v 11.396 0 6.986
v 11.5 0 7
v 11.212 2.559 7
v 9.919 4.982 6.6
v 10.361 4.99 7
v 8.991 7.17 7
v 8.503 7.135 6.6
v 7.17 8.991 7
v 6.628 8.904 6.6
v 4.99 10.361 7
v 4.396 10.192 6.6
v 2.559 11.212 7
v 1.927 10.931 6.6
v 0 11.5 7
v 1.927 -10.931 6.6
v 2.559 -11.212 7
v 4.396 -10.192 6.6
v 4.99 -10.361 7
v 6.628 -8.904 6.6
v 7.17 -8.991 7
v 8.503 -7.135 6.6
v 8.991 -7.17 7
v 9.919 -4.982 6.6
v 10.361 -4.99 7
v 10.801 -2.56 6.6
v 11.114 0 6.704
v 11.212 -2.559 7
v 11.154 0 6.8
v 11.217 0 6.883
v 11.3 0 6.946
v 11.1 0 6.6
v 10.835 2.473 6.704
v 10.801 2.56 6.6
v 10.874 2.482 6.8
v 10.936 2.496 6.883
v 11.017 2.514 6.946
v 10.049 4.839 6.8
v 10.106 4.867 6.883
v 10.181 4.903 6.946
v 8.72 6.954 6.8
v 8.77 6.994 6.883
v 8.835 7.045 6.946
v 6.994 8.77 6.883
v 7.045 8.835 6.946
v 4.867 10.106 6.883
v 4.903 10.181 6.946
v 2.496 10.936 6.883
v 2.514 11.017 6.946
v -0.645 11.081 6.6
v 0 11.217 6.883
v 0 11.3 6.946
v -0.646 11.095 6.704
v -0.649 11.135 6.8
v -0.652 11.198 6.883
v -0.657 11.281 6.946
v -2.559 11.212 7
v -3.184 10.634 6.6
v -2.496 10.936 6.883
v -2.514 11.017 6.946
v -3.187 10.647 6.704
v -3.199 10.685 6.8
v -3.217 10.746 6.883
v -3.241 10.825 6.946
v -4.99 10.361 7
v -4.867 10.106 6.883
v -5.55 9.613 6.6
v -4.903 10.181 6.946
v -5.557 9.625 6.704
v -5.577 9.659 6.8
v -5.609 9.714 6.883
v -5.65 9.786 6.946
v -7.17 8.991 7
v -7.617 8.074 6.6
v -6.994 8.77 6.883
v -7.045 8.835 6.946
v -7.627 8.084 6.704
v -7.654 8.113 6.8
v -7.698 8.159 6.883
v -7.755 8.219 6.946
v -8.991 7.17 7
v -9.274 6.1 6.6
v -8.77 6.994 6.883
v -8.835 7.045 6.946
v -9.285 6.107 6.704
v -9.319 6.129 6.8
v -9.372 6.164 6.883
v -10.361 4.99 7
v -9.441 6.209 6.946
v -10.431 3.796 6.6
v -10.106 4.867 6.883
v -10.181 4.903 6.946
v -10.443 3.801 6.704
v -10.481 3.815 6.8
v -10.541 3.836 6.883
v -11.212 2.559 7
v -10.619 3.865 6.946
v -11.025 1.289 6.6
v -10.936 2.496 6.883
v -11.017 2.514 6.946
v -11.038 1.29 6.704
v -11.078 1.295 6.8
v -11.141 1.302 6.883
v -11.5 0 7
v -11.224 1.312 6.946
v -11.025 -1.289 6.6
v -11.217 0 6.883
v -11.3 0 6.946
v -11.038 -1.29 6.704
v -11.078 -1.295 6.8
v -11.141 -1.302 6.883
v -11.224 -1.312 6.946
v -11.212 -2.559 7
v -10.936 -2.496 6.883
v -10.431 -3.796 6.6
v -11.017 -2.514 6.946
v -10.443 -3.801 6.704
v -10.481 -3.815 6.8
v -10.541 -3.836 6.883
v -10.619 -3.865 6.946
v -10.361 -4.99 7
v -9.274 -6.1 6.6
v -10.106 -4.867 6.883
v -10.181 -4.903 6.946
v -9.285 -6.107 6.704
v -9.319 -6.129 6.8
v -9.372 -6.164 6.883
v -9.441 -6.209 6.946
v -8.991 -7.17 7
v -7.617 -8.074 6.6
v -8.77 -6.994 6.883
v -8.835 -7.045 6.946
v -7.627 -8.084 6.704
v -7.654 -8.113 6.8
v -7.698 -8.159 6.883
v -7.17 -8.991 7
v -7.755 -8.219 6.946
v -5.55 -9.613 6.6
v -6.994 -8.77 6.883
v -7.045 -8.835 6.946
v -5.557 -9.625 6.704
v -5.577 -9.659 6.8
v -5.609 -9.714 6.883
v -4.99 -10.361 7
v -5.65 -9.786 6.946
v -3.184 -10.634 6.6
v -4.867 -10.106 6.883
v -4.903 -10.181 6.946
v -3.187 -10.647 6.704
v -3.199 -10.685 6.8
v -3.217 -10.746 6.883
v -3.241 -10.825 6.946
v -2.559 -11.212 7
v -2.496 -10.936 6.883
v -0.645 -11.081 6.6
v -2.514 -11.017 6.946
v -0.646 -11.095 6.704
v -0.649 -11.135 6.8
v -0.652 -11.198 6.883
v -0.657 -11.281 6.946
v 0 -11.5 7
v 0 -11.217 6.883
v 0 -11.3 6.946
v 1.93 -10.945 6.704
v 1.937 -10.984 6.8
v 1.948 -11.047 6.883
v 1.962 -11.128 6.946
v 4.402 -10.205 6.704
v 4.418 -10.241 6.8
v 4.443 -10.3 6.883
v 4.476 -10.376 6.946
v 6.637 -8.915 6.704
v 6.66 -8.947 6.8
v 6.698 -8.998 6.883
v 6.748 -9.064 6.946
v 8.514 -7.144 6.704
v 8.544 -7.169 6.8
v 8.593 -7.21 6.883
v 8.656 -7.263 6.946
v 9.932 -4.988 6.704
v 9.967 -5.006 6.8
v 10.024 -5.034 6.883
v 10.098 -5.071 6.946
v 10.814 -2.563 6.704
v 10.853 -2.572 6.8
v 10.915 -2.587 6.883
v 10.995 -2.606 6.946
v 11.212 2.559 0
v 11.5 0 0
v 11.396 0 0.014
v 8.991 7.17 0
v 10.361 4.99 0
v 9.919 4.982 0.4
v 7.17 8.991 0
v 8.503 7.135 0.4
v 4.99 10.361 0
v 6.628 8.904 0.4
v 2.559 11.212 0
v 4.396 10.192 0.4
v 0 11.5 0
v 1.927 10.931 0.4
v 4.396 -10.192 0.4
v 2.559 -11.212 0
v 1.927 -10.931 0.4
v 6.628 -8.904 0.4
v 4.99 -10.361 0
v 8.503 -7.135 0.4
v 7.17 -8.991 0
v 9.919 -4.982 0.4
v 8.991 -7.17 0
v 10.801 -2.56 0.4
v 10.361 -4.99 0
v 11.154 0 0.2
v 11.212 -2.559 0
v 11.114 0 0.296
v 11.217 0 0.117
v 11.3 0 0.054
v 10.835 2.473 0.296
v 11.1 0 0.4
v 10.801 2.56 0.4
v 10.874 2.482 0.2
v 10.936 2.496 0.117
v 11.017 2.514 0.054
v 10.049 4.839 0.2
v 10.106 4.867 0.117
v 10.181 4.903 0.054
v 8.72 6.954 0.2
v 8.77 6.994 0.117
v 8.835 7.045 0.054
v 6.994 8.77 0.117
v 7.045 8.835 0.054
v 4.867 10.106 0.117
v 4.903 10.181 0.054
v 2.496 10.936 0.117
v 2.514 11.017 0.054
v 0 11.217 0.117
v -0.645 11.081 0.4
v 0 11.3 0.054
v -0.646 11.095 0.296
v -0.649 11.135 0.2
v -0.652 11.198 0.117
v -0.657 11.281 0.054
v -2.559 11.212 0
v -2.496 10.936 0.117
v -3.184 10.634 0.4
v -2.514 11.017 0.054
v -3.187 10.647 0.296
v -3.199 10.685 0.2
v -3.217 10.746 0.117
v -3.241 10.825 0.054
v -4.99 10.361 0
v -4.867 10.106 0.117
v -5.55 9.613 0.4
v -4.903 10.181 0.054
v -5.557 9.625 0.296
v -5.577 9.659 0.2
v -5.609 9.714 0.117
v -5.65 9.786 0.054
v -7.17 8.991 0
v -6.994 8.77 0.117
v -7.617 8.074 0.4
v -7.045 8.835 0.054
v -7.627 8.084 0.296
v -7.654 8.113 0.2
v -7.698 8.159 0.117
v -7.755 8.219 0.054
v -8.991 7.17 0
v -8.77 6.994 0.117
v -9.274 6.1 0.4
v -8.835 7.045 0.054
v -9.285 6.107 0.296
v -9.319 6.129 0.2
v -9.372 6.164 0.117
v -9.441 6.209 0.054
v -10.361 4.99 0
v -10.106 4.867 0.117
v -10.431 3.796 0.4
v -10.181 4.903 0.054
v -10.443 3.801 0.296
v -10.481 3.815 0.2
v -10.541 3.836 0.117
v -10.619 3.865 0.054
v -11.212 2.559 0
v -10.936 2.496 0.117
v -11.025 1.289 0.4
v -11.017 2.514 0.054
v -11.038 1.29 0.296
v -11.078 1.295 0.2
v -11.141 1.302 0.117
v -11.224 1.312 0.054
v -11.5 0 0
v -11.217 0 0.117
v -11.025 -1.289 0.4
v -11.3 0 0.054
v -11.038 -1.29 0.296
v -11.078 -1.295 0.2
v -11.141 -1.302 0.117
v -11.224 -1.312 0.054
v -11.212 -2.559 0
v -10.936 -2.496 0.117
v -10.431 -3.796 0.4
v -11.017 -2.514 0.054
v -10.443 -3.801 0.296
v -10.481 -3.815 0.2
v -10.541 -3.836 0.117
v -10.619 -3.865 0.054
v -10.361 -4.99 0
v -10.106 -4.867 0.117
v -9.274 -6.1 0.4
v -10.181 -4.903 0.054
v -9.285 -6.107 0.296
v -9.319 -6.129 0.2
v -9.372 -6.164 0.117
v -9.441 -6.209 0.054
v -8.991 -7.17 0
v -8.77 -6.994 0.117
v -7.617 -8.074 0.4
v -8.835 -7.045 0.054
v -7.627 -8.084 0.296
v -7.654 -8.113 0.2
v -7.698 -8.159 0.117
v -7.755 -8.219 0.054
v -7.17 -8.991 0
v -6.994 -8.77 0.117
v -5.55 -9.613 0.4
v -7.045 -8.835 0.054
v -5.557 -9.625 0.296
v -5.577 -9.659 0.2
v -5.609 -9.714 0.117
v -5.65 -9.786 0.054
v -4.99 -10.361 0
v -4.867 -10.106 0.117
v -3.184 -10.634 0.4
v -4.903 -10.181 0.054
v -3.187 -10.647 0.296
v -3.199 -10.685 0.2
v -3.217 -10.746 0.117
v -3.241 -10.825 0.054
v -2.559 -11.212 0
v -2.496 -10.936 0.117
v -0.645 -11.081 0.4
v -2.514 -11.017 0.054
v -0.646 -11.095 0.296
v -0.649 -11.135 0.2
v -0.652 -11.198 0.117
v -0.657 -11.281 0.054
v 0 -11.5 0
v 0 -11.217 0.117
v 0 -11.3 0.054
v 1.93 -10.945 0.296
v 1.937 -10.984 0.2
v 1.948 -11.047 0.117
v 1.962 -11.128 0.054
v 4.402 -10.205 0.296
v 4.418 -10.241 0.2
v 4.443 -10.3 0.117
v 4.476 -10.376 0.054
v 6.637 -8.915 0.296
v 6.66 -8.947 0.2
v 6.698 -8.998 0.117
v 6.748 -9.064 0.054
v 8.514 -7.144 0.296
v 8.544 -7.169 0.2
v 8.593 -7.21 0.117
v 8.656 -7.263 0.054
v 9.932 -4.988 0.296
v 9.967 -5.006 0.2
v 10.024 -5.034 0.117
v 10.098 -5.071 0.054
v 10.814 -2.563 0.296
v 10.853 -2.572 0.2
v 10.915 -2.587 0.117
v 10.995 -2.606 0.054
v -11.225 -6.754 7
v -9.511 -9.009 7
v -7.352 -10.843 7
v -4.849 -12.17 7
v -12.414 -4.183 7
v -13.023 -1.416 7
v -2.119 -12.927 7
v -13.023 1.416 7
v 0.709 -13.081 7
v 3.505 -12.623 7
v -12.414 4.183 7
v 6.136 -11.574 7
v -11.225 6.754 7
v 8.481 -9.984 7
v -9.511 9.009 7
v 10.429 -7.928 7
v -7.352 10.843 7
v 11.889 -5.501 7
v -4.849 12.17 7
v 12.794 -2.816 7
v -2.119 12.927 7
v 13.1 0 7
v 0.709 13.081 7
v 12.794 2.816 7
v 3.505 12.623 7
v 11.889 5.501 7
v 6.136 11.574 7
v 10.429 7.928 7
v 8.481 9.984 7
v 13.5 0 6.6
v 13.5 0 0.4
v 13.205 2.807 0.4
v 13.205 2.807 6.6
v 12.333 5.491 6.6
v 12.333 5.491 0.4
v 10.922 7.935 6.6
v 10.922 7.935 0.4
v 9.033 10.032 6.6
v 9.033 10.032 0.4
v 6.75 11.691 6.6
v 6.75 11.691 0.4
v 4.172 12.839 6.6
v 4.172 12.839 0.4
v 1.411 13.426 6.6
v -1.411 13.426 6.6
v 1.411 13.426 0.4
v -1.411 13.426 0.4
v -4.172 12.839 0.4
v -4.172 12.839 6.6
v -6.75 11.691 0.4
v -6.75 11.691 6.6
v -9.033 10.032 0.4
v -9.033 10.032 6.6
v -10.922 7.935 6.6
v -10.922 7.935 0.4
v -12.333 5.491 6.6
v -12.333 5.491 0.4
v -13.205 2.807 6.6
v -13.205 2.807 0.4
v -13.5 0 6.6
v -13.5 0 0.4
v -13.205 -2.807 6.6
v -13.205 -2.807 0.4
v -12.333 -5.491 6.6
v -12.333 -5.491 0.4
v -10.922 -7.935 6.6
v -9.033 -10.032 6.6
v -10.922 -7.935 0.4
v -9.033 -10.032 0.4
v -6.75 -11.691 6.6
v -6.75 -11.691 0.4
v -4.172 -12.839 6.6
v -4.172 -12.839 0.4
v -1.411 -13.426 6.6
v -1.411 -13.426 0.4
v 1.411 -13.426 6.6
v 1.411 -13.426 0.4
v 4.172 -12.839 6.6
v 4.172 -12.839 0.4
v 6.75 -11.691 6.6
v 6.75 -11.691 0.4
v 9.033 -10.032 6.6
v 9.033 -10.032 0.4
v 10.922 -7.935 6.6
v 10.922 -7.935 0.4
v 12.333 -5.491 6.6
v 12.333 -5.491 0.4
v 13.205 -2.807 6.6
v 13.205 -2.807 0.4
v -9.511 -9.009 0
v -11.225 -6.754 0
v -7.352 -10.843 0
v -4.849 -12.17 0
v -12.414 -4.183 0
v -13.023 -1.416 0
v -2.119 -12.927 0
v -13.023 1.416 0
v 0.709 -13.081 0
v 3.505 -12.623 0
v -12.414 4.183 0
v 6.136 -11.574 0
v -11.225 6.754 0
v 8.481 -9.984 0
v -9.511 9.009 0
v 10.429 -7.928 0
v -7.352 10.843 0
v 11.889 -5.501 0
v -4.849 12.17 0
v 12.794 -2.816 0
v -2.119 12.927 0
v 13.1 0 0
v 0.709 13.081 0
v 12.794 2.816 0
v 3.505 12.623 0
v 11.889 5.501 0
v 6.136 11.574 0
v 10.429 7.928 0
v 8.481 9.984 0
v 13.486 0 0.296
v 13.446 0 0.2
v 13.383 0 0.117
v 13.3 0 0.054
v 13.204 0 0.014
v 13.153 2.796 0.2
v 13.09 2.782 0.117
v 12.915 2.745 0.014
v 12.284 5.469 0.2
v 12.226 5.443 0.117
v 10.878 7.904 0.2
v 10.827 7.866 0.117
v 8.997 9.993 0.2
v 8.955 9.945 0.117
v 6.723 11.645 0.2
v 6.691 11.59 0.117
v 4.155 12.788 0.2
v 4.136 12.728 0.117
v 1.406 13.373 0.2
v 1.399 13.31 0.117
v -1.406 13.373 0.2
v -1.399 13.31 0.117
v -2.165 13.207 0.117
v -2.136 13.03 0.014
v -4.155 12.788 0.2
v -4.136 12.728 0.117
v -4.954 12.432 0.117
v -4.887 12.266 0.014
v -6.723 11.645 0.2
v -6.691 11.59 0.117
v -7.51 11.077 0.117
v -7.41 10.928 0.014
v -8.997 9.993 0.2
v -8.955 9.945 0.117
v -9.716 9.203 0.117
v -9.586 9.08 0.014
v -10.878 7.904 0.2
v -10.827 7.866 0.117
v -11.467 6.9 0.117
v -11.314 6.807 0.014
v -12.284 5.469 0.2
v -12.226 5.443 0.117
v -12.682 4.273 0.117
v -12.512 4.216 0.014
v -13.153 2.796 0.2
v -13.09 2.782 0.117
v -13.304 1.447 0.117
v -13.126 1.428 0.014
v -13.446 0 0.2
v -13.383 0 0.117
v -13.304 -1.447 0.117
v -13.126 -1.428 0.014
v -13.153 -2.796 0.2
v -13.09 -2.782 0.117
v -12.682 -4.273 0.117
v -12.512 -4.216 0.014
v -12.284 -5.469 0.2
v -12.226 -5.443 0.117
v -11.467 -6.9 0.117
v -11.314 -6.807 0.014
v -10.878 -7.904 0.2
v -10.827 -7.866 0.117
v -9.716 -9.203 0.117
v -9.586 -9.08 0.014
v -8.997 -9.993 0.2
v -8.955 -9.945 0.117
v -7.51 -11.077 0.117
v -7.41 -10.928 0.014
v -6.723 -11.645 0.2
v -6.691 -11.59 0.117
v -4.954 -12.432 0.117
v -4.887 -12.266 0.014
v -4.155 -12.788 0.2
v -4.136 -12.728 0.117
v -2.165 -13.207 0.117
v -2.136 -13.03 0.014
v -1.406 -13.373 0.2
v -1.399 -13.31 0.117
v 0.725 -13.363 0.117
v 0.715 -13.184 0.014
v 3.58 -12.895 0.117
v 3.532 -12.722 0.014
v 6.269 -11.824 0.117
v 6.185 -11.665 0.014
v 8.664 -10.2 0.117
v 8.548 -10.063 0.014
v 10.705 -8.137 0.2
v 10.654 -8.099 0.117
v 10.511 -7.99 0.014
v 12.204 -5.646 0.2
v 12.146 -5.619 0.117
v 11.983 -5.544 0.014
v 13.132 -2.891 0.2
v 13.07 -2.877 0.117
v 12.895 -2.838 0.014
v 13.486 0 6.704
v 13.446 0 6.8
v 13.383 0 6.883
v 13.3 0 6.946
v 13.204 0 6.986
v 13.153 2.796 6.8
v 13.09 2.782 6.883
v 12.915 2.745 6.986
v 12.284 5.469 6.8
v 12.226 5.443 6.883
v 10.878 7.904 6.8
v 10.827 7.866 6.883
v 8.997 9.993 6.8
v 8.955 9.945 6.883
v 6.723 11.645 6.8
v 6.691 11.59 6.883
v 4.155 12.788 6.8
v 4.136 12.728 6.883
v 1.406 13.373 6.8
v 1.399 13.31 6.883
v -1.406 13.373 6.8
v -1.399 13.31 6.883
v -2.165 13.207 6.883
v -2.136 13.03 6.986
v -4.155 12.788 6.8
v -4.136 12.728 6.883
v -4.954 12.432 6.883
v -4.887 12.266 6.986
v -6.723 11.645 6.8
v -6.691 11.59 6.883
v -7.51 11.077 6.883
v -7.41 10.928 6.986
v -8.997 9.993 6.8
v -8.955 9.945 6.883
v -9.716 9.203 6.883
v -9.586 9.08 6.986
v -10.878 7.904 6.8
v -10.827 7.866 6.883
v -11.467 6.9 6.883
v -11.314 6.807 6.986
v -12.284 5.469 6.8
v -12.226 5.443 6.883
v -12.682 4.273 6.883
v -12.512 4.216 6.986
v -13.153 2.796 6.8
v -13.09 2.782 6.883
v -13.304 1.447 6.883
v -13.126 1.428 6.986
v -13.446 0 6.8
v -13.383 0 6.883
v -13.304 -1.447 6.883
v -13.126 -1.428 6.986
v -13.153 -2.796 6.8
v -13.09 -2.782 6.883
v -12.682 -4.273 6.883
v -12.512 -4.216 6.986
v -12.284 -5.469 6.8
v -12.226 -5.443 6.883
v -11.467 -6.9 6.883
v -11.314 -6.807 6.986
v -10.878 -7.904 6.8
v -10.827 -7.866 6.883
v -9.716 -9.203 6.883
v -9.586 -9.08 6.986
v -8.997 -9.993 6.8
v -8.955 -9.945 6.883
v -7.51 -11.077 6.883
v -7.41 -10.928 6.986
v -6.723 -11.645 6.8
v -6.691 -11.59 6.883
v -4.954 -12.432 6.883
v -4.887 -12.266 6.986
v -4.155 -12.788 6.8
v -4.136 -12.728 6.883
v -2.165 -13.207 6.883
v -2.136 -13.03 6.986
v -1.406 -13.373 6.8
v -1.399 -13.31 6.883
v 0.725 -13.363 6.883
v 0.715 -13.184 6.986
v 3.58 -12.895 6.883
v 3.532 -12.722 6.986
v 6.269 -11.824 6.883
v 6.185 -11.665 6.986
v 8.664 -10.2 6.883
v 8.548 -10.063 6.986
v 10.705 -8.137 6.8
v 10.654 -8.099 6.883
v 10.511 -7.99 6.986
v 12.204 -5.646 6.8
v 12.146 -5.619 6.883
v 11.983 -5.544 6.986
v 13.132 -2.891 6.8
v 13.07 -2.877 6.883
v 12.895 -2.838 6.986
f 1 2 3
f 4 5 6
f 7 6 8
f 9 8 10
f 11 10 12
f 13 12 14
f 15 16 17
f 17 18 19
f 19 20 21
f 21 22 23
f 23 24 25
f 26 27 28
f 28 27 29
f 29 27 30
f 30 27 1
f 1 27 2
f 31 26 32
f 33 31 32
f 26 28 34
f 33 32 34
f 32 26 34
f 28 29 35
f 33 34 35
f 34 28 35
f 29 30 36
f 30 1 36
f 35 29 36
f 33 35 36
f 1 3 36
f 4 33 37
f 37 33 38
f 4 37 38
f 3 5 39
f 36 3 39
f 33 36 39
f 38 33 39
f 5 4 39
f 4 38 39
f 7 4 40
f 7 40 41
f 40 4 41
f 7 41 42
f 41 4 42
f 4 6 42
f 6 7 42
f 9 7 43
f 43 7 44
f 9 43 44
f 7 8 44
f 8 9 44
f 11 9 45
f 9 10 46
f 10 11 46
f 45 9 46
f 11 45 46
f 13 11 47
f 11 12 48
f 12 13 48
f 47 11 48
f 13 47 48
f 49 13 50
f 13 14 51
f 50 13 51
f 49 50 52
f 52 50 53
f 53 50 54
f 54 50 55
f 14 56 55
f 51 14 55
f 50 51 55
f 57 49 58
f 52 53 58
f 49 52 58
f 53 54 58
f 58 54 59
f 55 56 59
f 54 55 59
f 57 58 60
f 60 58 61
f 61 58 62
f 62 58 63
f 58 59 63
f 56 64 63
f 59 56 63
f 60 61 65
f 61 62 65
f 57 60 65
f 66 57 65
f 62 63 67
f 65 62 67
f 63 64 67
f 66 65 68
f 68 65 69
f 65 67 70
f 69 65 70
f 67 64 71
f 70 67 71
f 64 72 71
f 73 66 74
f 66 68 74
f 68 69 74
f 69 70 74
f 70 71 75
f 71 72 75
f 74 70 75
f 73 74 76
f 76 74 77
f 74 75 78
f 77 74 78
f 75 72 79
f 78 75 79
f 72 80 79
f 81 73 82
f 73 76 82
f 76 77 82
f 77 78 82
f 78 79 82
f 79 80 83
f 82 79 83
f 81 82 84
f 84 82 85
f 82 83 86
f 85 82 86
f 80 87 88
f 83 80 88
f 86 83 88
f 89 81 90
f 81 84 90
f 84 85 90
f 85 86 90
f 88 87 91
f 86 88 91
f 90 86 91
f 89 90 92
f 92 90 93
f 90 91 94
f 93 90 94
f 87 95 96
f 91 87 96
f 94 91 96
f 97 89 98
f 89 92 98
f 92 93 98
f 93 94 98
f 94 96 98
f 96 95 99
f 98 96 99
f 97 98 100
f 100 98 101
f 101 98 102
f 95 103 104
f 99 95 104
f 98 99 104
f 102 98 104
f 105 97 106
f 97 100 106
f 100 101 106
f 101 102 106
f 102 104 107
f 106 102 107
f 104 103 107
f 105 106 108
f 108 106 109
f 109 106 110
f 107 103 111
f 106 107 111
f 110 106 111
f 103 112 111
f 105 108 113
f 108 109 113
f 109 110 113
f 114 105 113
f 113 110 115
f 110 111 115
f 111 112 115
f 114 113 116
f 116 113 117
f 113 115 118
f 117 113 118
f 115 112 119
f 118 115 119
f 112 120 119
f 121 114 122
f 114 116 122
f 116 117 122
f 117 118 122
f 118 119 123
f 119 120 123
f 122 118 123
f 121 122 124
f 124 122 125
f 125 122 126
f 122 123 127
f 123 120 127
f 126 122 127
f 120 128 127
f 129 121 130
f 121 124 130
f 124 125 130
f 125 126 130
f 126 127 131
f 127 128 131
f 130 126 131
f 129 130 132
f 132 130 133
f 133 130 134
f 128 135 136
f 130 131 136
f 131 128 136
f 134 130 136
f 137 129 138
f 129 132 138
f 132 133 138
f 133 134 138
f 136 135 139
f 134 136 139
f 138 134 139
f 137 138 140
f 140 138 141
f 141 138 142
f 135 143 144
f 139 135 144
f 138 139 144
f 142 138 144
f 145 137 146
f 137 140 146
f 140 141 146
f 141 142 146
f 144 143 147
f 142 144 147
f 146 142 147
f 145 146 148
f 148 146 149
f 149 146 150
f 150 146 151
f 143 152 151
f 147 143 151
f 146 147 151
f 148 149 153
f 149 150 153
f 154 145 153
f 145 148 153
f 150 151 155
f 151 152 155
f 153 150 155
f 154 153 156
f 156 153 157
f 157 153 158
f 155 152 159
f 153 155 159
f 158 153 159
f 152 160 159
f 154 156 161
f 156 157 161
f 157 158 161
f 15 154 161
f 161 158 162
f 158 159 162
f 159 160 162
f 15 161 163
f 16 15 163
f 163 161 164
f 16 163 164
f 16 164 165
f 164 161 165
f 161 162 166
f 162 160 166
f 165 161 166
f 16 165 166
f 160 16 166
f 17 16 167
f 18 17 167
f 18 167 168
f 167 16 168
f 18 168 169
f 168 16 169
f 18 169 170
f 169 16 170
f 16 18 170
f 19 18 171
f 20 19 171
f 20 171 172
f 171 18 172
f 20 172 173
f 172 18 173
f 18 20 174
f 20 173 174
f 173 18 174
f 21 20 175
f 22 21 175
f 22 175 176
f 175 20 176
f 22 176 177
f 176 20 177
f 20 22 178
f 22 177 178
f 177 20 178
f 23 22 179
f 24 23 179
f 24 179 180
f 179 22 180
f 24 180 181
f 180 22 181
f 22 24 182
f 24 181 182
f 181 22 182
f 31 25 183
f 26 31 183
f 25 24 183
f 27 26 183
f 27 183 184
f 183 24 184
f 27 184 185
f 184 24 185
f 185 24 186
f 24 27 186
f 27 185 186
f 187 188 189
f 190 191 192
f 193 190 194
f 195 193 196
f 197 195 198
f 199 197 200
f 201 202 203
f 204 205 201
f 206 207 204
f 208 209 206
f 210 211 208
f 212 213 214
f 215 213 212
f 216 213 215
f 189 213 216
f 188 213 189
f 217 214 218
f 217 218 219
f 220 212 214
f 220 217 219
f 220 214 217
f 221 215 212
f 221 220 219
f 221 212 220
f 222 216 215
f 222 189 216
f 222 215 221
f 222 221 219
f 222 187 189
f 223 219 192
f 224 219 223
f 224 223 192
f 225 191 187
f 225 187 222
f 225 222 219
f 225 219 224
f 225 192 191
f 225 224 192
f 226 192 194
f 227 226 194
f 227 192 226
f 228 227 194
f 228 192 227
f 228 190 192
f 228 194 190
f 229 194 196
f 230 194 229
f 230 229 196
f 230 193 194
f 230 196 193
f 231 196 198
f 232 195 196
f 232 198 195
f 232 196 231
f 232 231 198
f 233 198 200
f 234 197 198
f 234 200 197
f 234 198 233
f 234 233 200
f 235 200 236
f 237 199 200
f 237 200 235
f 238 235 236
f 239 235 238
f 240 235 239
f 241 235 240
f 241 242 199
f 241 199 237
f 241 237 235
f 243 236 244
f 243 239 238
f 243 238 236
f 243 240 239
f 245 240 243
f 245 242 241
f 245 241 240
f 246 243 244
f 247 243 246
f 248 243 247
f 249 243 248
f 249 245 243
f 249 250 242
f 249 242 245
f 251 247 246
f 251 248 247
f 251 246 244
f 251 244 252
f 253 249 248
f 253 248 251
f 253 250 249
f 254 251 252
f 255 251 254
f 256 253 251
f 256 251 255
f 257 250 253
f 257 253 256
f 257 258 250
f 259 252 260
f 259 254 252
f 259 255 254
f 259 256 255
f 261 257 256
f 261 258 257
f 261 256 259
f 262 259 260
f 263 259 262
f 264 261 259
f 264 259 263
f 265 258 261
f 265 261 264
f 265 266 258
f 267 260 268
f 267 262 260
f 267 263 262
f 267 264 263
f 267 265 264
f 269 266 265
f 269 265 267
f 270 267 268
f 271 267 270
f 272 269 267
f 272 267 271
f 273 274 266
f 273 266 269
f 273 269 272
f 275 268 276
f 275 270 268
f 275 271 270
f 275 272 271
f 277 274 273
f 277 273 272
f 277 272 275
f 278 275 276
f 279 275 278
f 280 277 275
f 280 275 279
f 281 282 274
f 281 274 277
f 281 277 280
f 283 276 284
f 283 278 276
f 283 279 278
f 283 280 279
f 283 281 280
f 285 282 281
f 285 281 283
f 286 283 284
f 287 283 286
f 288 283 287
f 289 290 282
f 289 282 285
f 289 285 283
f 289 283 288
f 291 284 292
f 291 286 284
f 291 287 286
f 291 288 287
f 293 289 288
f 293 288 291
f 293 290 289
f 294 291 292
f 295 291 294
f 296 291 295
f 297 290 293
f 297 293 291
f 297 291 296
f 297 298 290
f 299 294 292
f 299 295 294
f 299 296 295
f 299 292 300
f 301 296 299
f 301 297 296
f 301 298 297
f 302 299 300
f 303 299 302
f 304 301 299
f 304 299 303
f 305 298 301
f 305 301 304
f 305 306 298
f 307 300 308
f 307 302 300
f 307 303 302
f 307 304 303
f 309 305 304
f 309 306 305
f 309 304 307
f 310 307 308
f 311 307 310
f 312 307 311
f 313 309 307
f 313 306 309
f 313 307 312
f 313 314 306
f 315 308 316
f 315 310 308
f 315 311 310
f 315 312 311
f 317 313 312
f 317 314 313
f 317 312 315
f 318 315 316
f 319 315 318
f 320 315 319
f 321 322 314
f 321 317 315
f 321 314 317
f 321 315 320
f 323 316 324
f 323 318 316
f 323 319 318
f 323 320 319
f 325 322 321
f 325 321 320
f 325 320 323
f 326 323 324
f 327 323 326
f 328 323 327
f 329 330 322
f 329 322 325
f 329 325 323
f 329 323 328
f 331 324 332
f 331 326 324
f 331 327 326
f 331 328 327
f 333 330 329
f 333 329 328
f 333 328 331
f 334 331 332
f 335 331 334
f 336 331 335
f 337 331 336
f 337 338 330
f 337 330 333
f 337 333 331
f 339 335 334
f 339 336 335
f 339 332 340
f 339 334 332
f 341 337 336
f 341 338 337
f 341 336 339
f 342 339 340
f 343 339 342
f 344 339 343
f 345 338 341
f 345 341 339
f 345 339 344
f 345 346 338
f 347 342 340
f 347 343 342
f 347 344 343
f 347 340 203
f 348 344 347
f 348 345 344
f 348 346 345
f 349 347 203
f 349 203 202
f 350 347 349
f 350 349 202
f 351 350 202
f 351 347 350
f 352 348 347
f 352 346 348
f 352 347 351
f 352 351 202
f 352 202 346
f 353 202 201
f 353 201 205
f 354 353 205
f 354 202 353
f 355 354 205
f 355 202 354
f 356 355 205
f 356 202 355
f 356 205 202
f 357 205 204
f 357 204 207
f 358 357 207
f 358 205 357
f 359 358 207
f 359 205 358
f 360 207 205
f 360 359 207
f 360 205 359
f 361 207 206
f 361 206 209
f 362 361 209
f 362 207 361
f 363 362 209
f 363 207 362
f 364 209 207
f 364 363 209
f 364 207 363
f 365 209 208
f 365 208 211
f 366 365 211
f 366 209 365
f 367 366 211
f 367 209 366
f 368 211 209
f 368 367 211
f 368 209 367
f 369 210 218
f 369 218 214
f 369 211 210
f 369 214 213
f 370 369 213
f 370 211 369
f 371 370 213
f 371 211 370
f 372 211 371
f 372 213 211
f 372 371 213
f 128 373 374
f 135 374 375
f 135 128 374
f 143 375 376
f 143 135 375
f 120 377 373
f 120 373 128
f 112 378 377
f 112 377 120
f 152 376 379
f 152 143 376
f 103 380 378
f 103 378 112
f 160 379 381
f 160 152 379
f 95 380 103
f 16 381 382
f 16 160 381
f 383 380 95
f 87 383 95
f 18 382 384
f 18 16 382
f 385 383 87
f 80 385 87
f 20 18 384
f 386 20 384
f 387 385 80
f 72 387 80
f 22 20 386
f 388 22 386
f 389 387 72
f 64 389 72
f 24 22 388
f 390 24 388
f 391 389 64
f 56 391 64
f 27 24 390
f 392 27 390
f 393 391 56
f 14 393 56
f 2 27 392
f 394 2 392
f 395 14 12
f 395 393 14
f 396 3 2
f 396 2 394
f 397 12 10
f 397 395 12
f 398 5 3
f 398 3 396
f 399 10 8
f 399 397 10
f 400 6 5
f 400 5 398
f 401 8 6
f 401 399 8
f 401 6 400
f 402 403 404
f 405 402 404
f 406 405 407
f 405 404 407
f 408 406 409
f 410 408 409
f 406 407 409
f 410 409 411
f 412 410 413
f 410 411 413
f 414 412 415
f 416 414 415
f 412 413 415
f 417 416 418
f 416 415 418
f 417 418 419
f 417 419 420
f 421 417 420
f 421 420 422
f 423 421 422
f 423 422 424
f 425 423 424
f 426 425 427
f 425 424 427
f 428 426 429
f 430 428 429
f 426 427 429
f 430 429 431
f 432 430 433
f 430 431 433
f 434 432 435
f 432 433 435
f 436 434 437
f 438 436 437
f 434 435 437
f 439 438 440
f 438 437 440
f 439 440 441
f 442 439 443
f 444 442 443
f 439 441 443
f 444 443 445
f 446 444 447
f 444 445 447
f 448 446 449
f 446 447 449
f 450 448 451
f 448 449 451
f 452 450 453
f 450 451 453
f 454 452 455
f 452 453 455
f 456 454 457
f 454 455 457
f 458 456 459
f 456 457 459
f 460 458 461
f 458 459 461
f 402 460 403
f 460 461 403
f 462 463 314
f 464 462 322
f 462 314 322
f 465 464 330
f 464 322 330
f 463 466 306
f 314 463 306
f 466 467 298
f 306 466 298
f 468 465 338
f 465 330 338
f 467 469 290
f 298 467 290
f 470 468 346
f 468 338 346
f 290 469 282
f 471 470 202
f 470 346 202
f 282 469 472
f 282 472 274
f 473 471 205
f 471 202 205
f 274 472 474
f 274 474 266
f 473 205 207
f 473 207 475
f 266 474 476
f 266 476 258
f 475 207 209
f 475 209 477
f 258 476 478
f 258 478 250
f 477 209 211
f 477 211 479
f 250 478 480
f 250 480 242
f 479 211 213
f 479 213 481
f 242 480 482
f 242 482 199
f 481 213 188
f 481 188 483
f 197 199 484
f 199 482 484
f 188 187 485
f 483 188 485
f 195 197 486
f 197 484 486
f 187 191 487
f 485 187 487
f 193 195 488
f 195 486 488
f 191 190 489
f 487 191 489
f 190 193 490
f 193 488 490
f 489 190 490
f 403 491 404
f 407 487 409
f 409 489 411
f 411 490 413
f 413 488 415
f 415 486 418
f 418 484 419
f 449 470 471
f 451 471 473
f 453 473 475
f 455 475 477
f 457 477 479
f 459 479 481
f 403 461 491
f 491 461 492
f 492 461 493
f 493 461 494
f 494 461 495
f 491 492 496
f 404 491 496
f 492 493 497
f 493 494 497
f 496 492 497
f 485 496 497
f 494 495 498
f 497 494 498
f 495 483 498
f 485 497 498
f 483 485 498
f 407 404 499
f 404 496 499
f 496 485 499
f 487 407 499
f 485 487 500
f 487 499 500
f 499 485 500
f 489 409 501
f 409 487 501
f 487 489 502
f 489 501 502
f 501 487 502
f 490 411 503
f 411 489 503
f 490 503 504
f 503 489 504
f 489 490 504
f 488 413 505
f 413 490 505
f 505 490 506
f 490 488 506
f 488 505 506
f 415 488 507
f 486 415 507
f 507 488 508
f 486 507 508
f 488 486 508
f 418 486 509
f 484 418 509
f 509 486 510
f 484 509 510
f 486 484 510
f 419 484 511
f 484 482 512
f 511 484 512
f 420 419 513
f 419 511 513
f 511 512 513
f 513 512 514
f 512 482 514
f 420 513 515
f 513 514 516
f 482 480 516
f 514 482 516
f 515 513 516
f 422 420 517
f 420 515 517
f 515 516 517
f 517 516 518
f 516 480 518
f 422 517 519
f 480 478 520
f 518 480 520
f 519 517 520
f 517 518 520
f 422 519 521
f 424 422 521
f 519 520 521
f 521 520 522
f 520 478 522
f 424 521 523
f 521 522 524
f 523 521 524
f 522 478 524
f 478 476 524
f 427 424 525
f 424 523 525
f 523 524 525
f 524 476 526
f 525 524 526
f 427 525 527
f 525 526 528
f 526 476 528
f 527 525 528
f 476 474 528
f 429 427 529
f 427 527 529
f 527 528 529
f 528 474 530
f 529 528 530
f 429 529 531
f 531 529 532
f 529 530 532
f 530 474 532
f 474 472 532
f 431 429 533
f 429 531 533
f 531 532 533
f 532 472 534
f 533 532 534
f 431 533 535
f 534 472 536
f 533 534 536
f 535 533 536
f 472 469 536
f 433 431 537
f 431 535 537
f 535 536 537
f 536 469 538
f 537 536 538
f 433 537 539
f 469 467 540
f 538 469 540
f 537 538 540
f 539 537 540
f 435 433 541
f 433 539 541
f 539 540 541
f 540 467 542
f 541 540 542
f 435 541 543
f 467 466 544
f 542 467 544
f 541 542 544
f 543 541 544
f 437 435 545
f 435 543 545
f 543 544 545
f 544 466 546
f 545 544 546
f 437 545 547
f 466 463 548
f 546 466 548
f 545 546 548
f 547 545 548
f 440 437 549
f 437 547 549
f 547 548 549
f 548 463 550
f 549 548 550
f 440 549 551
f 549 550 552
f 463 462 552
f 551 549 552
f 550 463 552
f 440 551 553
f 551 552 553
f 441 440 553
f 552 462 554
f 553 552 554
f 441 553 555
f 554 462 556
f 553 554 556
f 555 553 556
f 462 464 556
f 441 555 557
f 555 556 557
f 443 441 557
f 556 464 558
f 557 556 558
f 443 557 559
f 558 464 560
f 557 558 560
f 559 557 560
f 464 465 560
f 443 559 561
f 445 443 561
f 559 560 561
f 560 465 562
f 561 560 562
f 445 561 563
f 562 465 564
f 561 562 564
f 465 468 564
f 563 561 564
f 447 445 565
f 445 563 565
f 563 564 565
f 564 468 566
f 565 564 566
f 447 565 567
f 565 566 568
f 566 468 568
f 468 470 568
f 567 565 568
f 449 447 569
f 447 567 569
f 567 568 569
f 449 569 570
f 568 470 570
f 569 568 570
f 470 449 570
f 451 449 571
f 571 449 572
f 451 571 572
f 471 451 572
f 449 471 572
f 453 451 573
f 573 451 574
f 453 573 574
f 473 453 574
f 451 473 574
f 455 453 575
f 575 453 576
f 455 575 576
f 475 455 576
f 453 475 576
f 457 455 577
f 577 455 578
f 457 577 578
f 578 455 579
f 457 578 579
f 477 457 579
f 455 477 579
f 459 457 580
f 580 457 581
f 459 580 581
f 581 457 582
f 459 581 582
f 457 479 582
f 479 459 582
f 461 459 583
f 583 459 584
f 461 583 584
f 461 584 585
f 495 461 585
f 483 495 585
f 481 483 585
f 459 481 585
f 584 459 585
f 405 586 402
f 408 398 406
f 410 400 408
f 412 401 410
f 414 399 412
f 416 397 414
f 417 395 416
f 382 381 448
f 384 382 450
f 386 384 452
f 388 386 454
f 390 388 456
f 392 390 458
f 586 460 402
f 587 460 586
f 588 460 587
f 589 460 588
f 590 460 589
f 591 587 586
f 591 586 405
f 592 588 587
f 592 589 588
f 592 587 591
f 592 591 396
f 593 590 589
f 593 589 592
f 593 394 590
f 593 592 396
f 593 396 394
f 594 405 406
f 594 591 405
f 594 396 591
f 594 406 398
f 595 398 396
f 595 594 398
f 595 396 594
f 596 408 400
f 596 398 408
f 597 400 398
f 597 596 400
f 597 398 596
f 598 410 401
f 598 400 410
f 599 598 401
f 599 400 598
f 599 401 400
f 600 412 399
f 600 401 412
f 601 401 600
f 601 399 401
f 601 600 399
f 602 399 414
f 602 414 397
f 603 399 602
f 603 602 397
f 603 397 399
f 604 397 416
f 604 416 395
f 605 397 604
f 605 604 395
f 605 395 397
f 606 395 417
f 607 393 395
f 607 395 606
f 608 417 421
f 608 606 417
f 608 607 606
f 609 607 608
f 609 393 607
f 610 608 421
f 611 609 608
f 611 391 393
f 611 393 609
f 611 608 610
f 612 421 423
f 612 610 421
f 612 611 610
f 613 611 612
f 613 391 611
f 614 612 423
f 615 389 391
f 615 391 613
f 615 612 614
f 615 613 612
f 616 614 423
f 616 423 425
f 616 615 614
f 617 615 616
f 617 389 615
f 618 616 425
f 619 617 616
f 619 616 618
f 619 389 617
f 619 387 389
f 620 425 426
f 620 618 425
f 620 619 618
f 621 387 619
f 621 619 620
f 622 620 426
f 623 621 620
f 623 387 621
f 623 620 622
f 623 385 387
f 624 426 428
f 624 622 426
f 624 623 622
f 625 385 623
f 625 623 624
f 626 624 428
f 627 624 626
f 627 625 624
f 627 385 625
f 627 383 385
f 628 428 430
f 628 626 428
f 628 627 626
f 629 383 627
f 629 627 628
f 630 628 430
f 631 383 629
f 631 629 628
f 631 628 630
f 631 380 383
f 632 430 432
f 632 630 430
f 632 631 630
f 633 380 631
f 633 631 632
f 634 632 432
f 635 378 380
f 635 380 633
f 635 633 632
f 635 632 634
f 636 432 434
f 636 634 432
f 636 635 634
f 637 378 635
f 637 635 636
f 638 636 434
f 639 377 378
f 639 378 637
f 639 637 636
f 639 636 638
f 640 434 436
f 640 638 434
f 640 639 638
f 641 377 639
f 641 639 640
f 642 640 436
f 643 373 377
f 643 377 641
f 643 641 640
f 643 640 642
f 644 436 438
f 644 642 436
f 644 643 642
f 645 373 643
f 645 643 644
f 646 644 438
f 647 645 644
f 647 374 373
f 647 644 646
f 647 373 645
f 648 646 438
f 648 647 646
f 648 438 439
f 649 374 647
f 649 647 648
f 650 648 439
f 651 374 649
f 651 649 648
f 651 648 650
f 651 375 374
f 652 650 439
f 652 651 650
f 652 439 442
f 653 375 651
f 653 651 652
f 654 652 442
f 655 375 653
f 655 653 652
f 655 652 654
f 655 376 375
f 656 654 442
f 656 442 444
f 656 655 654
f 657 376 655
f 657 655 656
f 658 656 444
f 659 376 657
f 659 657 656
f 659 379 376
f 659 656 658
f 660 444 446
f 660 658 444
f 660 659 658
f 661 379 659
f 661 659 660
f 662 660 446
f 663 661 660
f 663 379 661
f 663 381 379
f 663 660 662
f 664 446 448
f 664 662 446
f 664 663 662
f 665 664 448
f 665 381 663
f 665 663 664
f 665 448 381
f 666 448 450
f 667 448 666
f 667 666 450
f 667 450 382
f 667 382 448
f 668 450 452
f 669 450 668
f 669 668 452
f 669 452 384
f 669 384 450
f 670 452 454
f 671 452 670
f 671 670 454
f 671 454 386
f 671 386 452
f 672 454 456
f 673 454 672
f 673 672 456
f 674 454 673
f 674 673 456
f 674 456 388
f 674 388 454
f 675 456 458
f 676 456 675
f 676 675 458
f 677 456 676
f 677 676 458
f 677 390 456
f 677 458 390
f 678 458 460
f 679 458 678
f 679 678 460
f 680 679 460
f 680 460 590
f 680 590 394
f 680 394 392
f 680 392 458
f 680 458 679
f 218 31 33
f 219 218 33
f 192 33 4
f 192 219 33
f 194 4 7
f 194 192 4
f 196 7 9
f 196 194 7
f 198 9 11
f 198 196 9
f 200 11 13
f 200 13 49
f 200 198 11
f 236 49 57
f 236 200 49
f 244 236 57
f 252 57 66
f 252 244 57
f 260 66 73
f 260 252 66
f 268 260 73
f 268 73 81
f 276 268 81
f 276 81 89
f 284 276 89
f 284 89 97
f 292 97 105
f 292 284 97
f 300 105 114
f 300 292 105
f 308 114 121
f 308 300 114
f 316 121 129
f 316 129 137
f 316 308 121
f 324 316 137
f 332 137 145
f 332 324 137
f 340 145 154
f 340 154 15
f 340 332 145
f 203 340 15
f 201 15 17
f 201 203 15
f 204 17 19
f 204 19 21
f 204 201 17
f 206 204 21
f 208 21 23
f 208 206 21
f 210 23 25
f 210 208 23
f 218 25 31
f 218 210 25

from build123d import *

# Parameters (mm, degrees)
F0_R     = 13.5
F0_R_2   = 11.1
F1_DEPTH = 7
F2_R     = 0.4


# Not quite as in the source:
# - a feature names something its author has since deleted; it is built from what else it names


with BuildPart() as f1:
    # F0 (on Top) → F1 (new body)
    with BuildSketch(Plane.XY):
        Circle(F0_R)
        Circle(F0_R_2, mode=Mode.SUBTRACT)
    extrude(amount=F1_DEPTH)

    # F2
    f2_edges = [f1.edges().sort_by_distance(p)[0] for p in [
        (-11.1, 0, 7),
        (-13.5, 0, 7),
        (-13.5, 0, 0),
        (-11.1, 0, 0),
    ]]
    fillet(f2_edges, radius=F2_R)


solid = f1.part
